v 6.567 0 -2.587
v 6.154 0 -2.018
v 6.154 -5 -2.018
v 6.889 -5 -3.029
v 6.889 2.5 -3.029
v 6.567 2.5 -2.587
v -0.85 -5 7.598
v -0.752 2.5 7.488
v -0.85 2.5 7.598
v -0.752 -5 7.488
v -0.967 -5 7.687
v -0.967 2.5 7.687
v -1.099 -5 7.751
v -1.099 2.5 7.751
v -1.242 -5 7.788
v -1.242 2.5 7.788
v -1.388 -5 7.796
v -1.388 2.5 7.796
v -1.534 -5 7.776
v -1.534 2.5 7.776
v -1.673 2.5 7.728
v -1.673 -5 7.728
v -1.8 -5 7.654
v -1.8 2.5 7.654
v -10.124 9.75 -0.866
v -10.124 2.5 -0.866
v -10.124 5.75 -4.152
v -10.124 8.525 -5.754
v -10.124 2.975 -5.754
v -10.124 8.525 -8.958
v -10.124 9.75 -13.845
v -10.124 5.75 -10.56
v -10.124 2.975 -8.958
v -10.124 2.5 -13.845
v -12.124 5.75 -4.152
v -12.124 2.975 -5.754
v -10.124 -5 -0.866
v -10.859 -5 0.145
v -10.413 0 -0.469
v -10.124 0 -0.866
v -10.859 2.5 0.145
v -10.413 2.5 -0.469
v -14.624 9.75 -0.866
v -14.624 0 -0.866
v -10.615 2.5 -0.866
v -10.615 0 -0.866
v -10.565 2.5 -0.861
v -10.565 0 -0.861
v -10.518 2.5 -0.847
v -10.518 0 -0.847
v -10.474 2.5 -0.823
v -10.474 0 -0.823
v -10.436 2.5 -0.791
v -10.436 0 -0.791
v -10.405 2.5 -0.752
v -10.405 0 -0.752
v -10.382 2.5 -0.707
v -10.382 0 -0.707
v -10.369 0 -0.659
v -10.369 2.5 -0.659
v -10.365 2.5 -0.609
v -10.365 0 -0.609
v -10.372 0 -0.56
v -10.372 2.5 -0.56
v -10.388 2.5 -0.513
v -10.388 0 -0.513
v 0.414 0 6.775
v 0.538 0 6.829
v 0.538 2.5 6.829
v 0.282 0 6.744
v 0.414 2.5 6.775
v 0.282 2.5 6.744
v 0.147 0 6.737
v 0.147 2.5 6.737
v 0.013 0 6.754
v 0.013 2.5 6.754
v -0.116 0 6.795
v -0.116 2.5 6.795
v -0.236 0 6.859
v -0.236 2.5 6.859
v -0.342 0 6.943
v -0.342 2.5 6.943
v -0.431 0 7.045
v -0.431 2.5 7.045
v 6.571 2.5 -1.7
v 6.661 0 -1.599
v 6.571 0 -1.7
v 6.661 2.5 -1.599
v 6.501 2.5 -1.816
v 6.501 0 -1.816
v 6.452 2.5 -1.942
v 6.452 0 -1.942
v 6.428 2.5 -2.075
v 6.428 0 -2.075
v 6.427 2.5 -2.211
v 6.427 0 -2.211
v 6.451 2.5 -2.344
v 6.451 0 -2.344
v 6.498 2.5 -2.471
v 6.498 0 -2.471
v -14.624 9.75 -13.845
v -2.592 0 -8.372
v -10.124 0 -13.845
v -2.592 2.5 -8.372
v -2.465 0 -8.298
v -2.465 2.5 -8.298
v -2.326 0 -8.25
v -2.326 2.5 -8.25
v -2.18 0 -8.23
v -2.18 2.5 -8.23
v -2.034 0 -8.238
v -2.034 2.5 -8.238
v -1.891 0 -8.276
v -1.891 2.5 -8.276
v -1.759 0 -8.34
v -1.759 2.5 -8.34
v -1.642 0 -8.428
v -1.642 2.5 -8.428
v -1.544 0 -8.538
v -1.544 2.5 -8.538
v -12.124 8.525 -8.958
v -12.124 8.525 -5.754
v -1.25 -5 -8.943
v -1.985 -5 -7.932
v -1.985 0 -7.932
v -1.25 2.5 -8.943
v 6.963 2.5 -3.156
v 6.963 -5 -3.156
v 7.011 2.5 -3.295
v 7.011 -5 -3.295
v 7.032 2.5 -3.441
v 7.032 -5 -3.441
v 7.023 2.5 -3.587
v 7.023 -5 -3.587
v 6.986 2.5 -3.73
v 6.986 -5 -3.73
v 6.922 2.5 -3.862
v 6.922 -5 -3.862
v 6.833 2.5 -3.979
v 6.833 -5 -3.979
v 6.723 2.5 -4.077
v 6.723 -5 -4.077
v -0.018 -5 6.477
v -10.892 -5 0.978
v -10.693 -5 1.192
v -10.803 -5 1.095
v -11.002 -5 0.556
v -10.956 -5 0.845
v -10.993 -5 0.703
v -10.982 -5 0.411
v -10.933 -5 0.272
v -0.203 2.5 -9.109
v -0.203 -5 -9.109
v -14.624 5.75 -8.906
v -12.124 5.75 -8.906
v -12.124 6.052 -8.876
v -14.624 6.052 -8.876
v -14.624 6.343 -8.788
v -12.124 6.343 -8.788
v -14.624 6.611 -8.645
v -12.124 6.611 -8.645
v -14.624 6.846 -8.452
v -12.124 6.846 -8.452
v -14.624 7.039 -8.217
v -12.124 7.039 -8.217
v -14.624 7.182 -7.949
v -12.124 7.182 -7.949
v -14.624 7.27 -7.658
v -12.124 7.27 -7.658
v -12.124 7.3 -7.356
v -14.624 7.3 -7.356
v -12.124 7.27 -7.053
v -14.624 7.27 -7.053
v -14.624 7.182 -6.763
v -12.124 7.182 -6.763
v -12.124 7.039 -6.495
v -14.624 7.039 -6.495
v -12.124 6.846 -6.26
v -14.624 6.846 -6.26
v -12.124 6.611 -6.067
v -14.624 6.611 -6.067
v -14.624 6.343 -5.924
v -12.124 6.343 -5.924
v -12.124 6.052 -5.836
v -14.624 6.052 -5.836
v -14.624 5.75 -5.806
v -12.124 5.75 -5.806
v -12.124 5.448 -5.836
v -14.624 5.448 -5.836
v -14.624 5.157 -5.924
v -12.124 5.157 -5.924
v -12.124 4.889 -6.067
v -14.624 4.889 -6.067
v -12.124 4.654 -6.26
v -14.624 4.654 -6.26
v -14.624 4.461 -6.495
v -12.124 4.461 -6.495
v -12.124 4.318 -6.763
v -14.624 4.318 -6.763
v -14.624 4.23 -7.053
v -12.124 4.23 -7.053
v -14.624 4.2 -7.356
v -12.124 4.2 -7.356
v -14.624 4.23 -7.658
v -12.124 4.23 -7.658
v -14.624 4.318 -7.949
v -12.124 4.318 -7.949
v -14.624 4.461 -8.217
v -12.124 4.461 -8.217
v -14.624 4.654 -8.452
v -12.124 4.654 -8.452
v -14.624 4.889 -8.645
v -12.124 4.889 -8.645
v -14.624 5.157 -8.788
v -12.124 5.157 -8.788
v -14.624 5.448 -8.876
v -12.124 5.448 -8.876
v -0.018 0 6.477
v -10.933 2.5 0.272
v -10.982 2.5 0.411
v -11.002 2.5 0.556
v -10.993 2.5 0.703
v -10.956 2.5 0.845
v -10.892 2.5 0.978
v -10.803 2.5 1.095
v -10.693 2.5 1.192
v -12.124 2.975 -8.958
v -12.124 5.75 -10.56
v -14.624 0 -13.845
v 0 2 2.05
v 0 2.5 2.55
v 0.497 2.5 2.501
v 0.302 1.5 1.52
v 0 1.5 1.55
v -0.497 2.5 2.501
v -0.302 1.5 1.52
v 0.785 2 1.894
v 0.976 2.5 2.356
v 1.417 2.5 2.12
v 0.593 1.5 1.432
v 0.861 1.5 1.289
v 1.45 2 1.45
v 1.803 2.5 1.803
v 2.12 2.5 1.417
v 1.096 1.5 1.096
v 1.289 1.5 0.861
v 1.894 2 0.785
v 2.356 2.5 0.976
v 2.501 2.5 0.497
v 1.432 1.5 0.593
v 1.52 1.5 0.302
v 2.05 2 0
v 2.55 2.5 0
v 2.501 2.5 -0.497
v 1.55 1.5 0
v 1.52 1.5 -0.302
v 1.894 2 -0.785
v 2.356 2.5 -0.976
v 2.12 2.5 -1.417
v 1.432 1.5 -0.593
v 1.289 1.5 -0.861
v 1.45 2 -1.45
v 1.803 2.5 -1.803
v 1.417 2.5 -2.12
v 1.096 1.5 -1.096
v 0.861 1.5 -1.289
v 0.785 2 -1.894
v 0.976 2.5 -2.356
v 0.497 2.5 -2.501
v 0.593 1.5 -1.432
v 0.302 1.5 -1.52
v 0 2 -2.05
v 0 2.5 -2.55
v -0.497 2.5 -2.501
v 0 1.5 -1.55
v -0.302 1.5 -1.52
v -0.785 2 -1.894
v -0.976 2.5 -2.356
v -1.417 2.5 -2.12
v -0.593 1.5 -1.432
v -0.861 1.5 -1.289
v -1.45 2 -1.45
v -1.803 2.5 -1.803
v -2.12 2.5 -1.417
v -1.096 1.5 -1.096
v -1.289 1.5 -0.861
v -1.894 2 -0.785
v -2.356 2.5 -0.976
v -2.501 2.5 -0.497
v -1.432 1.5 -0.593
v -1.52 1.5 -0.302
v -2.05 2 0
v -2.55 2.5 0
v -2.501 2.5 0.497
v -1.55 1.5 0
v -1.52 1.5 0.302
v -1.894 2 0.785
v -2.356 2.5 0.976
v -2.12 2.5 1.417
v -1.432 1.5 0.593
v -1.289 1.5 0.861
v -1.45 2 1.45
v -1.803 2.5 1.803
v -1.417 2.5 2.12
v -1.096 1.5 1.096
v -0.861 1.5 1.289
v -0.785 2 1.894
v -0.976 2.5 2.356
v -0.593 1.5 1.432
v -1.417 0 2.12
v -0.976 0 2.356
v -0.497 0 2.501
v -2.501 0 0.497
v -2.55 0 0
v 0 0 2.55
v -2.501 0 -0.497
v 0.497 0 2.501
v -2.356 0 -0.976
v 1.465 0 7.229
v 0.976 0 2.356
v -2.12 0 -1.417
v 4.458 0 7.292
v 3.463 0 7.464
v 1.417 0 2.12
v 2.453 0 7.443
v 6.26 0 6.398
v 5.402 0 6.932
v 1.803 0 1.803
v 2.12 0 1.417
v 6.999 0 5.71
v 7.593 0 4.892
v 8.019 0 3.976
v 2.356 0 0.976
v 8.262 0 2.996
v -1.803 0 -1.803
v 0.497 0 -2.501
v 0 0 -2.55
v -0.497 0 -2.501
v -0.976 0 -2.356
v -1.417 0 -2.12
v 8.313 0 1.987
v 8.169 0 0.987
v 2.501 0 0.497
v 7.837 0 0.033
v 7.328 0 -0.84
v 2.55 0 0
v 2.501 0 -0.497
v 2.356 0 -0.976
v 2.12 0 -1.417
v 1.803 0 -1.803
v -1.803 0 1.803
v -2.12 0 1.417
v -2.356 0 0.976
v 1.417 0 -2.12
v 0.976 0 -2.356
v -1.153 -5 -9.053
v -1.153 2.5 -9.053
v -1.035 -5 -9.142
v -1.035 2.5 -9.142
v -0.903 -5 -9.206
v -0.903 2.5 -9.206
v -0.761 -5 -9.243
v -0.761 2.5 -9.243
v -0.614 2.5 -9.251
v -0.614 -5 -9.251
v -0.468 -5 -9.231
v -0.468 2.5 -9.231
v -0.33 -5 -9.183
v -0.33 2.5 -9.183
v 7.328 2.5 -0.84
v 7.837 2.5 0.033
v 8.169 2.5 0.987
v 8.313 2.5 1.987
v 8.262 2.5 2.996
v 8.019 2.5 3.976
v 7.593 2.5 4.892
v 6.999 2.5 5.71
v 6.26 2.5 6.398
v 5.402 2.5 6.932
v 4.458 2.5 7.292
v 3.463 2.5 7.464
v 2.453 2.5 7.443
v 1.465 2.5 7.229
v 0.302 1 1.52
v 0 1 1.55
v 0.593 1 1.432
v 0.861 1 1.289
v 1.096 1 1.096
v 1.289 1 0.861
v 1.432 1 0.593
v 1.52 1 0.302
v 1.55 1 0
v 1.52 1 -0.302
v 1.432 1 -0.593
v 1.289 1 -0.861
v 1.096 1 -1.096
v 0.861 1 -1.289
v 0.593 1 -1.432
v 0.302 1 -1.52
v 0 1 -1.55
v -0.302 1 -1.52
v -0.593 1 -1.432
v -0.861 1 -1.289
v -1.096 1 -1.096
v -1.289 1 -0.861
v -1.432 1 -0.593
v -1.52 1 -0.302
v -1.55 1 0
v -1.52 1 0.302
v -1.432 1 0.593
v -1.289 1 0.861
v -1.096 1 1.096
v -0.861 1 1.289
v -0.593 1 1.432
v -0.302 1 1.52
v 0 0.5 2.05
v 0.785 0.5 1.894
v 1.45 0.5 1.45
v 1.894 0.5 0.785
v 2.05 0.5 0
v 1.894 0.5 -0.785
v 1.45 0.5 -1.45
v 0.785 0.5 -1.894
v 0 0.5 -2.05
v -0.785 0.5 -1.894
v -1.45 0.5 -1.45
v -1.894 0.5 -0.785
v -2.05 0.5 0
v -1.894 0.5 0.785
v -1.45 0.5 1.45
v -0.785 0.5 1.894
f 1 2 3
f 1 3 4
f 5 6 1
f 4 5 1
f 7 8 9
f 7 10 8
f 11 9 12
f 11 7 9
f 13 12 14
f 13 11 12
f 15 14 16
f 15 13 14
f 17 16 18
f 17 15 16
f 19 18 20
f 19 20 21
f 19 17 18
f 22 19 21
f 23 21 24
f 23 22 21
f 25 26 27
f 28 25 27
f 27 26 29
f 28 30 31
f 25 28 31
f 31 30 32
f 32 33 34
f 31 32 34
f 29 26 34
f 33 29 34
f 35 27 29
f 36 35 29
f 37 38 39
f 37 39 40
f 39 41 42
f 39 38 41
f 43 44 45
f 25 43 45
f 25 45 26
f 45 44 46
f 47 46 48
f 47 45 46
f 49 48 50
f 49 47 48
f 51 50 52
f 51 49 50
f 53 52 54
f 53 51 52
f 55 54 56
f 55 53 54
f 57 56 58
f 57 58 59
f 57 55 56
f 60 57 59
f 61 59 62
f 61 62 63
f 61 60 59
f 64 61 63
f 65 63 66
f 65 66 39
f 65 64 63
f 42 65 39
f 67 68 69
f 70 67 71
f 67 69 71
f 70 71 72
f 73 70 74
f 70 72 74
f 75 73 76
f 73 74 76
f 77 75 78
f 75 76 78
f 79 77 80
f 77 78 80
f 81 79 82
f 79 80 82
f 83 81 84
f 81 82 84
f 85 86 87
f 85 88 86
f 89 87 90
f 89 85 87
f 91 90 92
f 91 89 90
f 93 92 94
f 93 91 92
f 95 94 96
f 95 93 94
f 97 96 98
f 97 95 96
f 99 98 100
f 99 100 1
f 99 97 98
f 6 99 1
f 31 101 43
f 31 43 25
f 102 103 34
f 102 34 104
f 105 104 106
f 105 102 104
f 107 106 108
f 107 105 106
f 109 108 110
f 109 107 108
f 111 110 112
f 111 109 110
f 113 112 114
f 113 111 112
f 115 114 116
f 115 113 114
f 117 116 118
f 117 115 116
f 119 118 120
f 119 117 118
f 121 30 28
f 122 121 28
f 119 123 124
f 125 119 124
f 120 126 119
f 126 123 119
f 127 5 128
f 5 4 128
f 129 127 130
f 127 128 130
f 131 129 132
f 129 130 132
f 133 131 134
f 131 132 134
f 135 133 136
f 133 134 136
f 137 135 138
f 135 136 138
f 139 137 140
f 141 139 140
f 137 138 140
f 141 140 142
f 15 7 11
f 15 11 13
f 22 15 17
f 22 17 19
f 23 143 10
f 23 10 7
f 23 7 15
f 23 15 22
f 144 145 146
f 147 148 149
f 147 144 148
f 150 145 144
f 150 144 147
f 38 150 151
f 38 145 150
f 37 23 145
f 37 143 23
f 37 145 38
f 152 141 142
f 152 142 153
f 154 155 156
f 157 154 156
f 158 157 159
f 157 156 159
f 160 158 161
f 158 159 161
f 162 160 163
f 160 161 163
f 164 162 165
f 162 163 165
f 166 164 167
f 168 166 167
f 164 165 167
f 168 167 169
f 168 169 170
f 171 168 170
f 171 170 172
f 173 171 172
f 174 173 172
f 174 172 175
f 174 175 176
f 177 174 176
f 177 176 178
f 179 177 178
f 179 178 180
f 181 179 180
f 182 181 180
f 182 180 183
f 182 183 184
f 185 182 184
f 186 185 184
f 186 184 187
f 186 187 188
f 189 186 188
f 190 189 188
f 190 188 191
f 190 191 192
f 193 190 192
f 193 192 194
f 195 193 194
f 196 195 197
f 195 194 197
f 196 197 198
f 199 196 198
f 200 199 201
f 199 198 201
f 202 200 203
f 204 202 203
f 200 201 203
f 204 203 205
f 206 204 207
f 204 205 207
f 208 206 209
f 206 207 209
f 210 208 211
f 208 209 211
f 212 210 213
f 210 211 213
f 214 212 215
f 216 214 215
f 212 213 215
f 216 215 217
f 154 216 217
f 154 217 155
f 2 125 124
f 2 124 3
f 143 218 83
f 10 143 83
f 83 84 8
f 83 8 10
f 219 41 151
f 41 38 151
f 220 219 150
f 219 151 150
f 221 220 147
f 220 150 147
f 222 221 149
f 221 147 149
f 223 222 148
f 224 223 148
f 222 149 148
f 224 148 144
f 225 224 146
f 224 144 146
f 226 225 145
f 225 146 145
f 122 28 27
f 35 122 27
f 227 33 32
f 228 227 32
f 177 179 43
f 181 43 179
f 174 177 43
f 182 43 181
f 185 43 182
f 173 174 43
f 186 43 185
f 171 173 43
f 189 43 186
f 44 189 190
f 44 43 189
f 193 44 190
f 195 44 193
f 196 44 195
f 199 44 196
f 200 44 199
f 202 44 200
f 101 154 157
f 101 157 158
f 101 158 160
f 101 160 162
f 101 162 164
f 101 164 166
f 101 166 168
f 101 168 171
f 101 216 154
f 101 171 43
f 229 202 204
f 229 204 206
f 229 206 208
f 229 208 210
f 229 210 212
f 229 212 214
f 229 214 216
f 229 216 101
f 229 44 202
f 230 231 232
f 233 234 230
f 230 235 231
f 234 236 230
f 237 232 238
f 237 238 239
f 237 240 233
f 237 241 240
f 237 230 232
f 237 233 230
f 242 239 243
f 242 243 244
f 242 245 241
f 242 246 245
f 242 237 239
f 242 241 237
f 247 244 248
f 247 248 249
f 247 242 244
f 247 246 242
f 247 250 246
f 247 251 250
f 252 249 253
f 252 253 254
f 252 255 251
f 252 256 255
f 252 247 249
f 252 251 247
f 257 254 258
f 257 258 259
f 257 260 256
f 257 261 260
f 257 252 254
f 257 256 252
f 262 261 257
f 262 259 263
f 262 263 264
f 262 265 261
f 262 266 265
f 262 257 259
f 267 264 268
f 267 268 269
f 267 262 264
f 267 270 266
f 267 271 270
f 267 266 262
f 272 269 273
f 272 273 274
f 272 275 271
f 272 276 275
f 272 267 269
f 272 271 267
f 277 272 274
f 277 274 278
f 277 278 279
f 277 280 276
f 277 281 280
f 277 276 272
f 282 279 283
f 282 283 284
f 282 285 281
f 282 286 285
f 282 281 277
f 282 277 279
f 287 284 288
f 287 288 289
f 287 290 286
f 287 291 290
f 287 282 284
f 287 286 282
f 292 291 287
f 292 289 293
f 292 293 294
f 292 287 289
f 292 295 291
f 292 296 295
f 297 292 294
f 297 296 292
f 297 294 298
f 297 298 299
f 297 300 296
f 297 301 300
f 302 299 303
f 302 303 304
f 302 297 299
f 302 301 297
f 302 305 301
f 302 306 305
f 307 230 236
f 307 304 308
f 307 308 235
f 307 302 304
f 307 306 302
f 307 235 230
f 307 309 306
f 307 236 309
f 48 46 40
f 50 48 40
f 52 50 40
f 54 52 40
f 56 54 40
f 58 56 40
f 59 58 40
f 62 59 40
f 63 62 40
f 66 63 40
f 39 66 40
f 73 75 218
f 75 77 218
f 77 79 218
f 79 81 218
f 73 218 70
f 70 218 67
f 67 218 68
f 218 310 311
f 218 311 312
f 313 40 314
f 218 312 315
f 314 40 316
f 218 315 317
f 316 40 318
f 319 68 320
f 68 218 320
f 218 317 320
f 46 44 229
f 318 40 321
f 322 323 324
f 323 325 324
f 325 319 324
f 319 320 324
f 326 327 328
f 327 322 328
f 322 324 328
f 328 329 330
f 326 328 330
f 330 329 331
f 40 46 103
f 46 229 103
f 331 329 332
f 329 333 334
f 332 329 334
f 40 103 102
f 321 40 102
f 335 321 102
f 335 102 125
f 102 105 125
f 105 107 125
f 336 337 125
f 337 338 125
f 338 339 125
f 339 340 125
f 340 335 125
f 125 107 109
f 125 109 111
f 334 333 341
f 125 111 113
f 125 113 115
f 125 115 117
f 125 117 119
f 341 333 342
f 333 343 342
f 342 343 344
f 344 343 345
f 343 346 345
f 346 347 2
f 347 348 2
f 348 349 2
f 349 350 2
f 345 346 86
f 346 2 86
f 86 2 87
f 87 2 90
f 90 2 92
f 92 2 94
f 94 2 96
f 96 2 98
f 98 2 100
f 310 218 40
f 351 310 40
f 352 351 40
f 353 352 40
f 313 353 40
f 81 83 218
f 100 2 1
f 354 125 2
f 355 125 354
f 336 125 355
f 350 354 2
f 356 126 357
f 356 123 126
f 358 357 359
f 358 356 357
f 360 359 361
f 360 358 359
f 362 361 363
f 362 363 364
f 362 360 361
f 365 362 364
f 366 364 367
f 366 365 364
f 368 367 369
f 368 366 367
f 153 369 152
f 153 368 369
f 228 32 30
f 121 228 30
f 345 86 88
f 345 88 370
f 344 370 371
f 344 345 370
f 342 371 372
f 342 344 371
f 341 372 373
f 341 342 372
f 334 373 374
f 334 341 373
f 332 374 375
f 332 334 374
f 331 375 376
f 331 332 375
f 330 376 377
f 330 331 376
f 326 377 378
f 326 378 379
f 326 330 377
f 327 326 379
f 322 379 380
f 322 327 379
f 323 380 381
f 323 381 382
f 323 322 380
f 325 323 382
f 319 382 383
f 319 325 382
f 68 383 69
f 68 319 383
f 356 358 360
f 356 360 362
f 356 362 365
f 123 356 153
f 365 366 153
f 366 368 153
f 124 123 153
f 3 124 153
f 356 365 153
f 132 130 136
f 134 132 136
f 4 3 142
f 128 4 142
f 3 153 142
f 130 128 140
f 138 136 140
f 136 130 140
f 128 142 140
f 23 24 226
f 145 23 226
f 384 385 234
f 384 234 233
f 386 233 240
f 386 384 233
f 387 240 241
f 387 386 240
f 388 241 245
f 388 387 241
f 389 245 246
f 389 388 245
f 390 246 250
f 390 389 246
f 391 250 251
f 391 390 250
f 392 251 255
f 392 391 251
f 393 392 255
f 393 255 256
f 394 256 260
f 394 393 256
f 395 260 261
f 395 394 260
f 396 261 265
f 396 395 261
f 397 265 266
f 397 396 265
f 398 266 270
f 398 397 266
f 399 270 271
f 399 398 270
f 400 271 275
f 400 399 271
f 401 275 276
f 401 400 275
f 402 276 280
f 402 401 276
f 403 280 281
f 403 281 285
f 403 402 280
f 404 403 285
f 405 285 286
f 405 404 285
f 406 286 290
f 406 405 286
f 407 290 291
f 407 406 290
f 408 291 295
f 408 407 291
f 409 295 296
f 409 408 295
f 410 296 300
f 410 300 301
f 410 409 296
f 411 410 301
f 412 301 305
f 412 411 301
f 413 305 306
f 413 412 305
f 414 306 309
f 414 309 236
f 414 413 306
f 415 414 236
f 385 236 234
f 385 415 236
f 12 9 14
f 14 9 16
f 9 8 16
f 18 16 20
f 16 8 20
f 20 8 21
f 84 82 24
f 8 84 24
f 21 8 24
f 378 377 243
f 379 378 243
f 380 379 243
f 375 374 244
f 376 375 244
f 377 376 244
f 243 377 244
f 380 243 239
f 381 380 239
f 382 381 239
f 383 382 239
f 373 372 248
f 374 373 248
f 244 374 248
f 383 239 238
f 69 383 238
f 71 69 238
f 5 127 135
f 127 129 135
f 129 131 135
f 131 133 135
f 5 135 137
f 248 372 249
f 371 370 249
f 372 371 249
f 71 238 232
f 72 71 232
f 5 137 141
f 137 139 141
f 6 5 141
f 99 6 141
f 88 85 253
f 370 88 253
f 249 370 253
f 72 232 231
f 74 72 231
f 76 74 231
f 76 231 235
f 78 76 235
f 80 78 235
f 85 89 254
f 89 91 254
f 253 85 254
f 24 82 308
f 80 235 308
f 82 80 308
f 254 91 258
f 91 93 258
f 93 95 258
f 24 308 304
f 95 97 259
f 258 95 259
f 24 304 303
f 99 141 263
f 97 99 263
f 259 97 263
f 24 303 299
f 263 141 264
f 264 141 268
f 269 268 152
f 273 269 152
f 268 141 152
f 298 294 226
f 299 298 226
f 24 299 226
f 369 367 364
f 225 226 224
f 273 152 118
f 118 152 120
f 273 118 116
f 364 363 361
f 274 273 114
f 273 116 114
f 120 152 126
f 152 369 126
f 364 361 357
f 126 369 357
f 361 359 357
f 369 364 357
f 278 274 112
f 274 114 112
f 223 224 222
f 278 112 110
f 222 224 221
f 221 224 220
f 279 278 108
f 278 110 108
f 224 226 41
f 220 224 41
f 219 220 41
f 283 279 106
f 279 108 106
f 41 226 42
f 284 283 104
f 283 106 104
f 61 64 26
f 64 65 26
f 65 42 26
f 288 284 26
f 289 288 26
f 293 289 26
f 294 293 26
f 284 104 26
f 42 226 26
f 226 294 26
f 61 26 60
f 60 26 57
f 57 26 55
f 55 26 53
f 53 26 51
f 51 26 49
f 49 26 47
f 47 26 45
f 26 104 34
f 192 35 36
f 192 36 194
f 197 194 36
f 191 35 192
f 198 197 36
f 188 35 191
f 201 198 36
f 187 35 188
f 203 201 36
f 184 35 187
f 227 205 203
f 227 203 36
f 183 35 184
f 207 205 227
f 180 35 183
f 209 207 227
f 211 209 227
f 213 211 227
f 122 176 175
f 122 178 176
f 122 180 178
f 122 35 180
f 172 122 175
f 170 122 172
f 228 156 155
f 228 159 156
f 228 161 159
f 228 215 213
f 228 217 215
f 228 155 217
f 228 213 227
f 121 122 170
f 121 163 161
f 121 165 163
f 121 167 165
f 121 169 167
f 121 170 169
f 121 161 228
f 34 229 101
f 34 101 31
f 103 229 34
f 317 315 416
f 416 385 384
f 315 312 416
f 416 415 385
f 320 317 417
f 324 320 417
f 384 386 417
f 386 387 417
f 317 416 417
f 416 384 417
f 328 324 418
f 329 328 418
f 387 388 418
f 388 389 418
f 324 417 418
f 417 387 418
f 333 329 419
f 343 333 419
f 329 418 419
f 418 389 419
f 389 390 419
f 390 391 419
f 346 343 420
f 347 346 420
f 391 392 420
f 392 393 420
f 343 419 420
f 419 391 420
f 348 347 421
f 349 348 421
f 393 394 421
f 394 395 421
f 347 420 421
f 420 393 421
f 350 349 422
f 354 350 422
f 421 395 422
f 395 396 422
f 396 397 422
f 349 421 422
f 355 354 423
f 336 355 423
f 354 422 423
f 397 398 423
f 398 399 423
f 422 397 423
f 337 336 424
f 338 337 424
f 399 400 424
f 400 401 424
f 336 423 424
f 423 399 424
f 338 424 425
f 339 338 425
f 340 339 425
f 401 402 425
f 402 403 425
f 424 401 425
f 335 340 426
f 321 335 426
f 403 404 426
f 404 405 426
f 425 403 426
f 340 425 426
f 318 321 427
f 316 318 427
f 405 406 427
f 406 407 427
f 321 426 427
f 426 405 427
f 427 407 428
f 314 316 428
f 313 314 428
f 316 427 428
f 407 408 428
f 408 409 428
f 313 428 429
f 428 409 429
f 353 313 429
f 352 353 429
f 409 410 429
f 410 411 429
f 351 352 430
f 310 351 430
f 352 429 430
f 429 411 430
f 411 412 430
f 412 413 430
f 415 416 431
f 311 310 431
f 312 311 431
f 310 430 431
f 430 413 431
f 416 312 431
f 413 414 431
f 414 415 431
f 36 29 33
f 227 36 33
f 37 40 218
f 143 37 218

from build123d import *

# Parameters (mm, degrees)
SKETCH_1_R          = 1.55
EXTRUDE_511_DEPTH   = 2.5
EXTRUDE_START       = 2.5
EXTRUDE_978_DEPTH   = 7.5
SKETCH_3_W          = 4.5
SKETCH_3_H          = 12.978713764
EXTRUDE_1_DEPTH     = 9.75
CHAMFER_1_SIZE      = 1
FILLET_5_R          = 0.75
CUT_EXTRUDE_1_DEPTH = 2
SKETCH_7_R          = 1.55
CUT_EXTRUDE_2_DEPTH = 4.5
FILLET_6_R          = 0.25


with BuildPart() as part:
    # 草图1 → Extrude 511 (new body)
    with BuildSketch(Plane(origin=(0, 0, 0), x_dir=(1, 0, 0), z_dir=(0, 1, 0))):
        with BuildLine():
            Line((-10.1243866, 13.845154317), (6.15423406, 2.01804411))
            ThreePointArc((6.15423406, 2.01804411), (7.315700706, -5.315167685), (-0.017511089, -6.476634331))
            Line((-0.017511089, -6.476634331), (-10.1243866, 0.866440553))
            Line((-10.1243866, 0.866440553), (-10.1243866, 13.845154317))
        make_face()
        with Locations(Location((0, 0, 0), (0, 0, 270))):
            Circle(SKETCH_1_R, mode=Mode.SUBTRACT)
    extrude(amount=EXTRUDE_511_DEPTH)

    # 草图2 → Extrude 978 (add)
    with BuildSketch(Plane(origin=(0, 0, 0), x_dir=(1, 0, 0), z_dir=(0, 1, 0)).offset(EXTRUDE_START)):
        Polygon((-10.1243866, 0.866440553), (-0.017511089, -6.476634331), (-1.193081594, -8.09466832), (-11.299957105, -0.751593436), align=None)
        Polygon((7.329804565, 3.636078099), (-0.809505765, 9.549633202), (-1.98507627, 7.931599213), (6.15423406, 2.01804411), align=None)
    extrude(amount=-EXTRUDE_978_DEPTH)

    # 草图3 → 限位-1 (add)
    with BuildSketch(Plane(origin=(0, 0, 0), x_dir=(1, 0, 0), z_dir=(0, 1, 0))):
        with Locations((-12.3743866, 7.355797435)):
            Rectangle(SKETCH_3_W, SKETCH_3_H)
    extrude(amount=EXTRUDE_1_DEPTH)

    # 倒角1
    chamfer_1_edges = [part.edges().sort_by_distance(p)[0] for p in [
        (0, 0, -1.55),
        (0, 2.5, -1.55),
    ]]
    chamfer(chamfer_1_edges, length=CHAMFER_1_SIZE)

    # 圆角5
    fillet_5_edges = [part.edges().sort_by_distance(p)[0] for p in [
        (-1.193081594, -1.25, 8.09466832),
        (-11.299957105, -1.25, 0.751593436),
        (-1.98507627, 1.25, -7.931599213),
        (-0.809505765, -1.25, -9.549633202),
        (7.329804565, -1.25, -3.636078099),
        (-0.017511089, 1.25, 6.476634331),
        (6.15423406, 1.25, -2.01804411),
    ]]
    fillet(fillet_5_edges, radius=FILLET_5_R)

    # 草图5 → 切除-拉伸1 (cut)
    with BuildSketch(Plane(origin=(-10.1243866, 0, 0), x_dir=(0, 0, -1), z_dir=(1, 0, 0))):
        Polygon((10.560091429, 5.75), (8.957944432, 8.525), (5.753650438, 8.525), (4.151503441, 5.75), (5.753650438, 2.975), (8.957944432, 2.975), align=None)
    extrude(amount=-CUT_EXTRUDE_1_DEPTH, mode=Mode.SUBTRACT)

    # 草图7 → 切除-拉伸2 (cut)
    with BuildSketch(Plane(origin=(-10.1243866, 0, 0), x_dir=(0, 0, -1), z_dir=(1, 0, 0))):
        with Locations((7.355797435, 5.75)):
            Circle(SKETCH_7_R)
    extrude(amount=-CUT_EXTRUDE_2_DEPTH, mode=Mode.SUBTRACT)

    # 圆角6
    fillet_6_edges = [part.edges().sort_by_distance(p)[0] for p in [
        (-10.1243866, 1.25, -0.866440553),
    ]]
    fillet(fillet_6_edges, radius=FILLET_6_R)


solid = part.part
